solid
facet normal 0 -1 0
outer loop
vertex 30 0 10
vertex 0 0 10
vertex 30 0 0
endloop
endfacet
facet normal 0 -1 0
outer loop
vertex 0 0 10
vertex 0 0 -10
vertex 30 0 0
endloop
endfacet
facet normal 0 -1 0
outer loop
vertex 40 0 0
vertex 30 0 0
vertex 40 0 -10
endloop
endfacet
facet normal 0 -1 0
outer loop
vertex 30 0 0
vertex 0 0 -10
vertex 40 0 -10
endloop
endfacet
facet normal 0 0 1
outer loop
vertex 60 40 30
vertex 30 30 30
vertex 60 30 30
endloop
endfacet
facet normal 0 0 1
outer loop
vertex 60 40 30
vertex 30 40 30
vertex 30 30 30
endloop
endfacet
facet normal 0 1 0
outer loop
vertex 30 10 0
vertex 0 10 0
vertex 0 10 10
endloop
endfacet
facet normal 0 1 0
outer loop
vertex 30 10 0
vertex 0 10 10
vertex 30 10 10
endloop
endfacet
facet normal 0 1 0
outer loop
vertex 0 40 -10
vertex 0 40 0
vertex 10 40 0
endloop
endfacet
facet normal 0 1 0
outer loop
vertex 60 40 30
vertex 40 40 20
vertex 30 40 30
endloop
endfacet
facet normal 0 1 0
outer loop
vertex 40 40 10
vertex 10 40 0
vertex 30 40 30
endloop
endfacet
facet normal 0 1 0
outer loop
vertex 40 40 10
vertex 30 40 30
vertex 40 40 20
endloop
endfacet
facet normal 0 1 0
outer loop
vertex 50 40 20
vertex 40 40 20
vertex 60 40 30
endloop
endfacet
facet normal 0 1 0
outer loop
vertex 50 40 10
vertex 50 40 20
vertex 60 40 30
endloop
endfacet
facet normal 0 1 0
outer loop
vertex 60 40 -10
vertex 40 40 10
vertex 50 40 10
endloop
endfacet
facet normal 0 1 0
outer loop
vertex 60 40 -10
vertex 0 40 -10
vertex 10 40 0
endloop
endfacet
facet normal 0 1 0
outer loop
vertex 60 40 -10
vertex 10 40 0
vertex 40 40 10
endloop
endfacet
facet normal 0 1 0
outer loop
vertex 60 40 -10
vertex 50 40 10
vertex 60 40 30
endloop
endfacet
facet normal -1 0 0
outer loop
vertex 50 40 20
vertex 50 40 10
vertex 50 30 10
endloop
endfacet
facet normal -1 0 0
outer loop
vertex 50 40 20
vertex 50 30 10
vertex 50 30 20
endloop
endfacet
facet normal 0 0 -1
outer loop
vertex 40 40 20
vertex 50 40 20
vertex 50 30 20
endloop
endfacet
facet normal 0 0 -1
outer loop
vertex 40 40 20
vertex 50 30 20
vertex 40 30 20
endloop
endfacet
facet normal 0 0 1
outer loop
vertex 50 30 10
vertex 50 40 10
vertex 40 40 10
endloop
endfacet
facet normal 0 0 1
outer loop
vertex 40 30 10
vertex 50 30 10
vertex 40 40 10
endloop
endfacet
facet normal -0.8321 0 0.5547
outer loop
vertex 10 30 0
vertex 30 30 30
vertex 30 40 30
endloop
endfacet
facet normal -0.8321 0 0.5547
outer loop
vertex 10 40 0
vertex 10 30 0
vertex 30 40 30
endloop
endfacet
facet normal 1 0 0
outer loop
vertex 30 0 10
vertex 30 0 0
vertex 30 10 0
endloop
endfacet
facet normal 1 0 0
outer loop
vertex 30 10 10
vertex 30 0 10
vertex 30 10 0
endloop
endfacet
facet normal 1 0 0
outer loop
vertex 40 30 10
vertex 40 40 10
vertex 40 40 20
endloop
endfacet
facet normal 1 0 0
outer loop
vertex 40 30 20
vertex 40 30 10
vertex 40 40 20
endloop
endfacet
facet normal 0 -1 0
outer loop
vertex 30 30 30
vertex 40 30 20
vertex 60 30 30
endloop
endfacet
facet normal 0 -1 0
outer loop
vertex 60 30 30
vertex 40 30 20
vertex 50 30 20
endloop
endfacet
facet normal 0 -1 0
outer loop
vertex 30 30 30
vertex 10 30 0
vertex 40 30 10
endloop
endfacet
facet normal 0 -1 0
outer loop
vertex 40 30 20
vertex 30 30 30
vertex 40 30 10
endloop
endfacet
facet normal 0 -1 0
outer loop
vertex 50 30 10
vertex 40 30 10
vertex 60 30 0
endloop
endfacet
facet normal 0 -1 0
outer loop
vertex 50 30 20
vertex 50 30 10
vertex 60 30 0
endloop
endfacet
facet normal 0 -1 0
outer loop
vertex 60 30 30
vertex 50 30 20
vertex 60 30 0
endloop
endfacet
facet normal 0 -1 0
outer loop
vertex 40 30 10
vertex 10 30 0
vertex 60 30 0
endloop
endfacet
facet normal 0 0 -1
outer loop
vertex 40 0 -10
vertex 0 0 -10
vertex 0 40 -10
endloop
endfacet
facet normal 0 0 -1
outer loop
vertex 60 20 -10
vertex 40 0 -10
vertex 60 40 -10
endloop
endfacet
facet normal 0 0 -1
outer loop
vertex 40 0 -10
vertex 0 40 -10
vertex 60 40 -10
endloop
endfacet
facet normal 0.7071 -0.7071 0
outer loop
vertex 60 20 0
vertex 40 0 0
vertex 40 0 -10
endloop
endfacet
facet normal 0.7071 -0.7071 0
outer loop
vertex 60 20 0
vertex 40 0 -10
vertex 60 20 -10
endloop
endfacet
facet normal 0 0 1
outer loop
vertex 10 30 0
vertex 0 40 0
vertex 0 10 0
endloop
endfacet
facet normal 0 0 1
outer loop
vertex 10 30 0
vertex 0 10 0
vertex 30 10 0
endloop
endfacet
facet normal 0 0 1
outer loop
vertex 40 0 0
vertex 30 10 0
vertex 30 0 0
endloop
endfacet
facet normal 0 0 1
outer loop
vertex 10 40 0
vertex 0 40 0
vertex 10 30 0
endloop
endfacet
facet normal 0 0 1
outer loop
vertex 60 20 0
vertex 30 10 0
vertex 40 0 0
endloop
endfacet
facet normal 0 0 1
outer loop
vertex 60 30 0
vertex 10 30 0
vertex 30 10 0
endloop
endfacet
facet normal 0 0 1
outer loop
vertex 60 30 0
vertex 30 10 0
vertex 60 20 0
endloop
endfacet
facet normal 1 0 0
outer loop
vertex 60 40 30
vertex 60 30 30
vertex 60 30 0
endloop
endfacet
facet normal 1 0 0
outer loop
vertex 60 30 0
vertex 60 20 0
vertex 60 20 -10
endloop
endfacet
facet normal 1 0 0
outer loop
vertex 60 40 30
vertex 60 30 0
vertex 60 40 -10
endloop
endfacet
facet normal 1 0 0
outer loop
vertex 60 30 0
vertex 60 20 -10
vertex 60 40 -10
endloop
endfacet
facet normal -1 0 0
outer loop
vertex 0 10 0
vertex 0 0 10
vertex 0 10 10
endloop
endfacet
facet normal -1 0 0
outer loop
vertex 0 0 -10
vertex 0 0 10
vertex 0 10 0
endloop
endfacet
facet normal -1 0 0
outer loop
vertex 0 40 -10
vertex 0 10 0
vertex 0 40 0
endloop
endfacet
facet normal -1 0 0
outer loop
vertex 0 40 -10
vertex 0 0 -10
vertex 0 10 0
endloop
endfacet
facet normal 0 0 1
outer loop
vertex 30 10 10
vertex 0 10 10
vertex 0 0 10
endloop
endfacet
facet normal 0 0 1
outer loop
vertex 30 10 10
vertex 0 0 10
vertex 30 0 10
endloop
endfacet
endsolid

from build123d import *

# Parameters (mm, degrees)
F0_W     = 30
F0_H     = 10
F0_W_2   = 50
F1_DEPTH = 10
F2_DEPTH = 10
F3_DEPTH = 30
F4_W     = 10
F4_H     = 10
F5_DEPTH = 10
F6_SIZE2 = 29.99999
F6_SIZE  = 19.99999


# Not quite as in the source:
# - a fillet or chamfer is up to 0.001 mm smaller than in the source, because OpenCascade refuses the exact size


with BuildPart() as f1:
    # F0 (on Top) → F1 (new body)
    with BuildSketch(Plane.XY):
        with Locations((15, 5)):
            Rectangle(F0_W, F0_H)
        with Locations((35, 35)):
            Rectangle(F0_W_2, F0_H)
        Polygon((30, 10), (30, 0), (40, 0), (60, 20), (60, 30), (10, 30), (10, 40), (0, 40), (0, 10), align=None)
    extrude(amount=-F1_DEPTH)

    # F0 (on Top) → F2 (join)
    with BuildSketch(Plane.XY):
        with Locations((15, 5)):
            Rectangle(F0_W, F0_H)
    extrude(amount=F2_DEPTH)

    # F0 (on Top) → F3 (join)
    with BuildSketch(Plane.XY):
        with Locations((35, 35)):
            Rectangle(F0_W_2, F0_H)
    extrude(amount=F3_DEPTH)

    # F4 (on face) → F5 (cut)
    with BuildSketch(Plane(origin=(0, 40, 0), x_dir=(-1, 0, 0), z_dir=(0, 1, 0))):
        with Locations((-45, 15)):
            Rectangle(F4_W, F4_H)
    extrude(amount=-F5_DEPTH, mode=Mode.SUBTRACT)

    # F6 (size 20 and 30 in the source; OpenCascade refuses exactly that, so slightly less here)
    f6_edges = [f1.edges().sort_by_distance(p)[0] for p in [
        (10, 35, 30),
    ]]
    f6_side = f1.faces().sort_by_distance((35, 35, 30))[0]
    chamfer(f6_edges, length=F6_SIZE, length2=F6_SIZE2, reference=f6_side)


solid = f1.part
